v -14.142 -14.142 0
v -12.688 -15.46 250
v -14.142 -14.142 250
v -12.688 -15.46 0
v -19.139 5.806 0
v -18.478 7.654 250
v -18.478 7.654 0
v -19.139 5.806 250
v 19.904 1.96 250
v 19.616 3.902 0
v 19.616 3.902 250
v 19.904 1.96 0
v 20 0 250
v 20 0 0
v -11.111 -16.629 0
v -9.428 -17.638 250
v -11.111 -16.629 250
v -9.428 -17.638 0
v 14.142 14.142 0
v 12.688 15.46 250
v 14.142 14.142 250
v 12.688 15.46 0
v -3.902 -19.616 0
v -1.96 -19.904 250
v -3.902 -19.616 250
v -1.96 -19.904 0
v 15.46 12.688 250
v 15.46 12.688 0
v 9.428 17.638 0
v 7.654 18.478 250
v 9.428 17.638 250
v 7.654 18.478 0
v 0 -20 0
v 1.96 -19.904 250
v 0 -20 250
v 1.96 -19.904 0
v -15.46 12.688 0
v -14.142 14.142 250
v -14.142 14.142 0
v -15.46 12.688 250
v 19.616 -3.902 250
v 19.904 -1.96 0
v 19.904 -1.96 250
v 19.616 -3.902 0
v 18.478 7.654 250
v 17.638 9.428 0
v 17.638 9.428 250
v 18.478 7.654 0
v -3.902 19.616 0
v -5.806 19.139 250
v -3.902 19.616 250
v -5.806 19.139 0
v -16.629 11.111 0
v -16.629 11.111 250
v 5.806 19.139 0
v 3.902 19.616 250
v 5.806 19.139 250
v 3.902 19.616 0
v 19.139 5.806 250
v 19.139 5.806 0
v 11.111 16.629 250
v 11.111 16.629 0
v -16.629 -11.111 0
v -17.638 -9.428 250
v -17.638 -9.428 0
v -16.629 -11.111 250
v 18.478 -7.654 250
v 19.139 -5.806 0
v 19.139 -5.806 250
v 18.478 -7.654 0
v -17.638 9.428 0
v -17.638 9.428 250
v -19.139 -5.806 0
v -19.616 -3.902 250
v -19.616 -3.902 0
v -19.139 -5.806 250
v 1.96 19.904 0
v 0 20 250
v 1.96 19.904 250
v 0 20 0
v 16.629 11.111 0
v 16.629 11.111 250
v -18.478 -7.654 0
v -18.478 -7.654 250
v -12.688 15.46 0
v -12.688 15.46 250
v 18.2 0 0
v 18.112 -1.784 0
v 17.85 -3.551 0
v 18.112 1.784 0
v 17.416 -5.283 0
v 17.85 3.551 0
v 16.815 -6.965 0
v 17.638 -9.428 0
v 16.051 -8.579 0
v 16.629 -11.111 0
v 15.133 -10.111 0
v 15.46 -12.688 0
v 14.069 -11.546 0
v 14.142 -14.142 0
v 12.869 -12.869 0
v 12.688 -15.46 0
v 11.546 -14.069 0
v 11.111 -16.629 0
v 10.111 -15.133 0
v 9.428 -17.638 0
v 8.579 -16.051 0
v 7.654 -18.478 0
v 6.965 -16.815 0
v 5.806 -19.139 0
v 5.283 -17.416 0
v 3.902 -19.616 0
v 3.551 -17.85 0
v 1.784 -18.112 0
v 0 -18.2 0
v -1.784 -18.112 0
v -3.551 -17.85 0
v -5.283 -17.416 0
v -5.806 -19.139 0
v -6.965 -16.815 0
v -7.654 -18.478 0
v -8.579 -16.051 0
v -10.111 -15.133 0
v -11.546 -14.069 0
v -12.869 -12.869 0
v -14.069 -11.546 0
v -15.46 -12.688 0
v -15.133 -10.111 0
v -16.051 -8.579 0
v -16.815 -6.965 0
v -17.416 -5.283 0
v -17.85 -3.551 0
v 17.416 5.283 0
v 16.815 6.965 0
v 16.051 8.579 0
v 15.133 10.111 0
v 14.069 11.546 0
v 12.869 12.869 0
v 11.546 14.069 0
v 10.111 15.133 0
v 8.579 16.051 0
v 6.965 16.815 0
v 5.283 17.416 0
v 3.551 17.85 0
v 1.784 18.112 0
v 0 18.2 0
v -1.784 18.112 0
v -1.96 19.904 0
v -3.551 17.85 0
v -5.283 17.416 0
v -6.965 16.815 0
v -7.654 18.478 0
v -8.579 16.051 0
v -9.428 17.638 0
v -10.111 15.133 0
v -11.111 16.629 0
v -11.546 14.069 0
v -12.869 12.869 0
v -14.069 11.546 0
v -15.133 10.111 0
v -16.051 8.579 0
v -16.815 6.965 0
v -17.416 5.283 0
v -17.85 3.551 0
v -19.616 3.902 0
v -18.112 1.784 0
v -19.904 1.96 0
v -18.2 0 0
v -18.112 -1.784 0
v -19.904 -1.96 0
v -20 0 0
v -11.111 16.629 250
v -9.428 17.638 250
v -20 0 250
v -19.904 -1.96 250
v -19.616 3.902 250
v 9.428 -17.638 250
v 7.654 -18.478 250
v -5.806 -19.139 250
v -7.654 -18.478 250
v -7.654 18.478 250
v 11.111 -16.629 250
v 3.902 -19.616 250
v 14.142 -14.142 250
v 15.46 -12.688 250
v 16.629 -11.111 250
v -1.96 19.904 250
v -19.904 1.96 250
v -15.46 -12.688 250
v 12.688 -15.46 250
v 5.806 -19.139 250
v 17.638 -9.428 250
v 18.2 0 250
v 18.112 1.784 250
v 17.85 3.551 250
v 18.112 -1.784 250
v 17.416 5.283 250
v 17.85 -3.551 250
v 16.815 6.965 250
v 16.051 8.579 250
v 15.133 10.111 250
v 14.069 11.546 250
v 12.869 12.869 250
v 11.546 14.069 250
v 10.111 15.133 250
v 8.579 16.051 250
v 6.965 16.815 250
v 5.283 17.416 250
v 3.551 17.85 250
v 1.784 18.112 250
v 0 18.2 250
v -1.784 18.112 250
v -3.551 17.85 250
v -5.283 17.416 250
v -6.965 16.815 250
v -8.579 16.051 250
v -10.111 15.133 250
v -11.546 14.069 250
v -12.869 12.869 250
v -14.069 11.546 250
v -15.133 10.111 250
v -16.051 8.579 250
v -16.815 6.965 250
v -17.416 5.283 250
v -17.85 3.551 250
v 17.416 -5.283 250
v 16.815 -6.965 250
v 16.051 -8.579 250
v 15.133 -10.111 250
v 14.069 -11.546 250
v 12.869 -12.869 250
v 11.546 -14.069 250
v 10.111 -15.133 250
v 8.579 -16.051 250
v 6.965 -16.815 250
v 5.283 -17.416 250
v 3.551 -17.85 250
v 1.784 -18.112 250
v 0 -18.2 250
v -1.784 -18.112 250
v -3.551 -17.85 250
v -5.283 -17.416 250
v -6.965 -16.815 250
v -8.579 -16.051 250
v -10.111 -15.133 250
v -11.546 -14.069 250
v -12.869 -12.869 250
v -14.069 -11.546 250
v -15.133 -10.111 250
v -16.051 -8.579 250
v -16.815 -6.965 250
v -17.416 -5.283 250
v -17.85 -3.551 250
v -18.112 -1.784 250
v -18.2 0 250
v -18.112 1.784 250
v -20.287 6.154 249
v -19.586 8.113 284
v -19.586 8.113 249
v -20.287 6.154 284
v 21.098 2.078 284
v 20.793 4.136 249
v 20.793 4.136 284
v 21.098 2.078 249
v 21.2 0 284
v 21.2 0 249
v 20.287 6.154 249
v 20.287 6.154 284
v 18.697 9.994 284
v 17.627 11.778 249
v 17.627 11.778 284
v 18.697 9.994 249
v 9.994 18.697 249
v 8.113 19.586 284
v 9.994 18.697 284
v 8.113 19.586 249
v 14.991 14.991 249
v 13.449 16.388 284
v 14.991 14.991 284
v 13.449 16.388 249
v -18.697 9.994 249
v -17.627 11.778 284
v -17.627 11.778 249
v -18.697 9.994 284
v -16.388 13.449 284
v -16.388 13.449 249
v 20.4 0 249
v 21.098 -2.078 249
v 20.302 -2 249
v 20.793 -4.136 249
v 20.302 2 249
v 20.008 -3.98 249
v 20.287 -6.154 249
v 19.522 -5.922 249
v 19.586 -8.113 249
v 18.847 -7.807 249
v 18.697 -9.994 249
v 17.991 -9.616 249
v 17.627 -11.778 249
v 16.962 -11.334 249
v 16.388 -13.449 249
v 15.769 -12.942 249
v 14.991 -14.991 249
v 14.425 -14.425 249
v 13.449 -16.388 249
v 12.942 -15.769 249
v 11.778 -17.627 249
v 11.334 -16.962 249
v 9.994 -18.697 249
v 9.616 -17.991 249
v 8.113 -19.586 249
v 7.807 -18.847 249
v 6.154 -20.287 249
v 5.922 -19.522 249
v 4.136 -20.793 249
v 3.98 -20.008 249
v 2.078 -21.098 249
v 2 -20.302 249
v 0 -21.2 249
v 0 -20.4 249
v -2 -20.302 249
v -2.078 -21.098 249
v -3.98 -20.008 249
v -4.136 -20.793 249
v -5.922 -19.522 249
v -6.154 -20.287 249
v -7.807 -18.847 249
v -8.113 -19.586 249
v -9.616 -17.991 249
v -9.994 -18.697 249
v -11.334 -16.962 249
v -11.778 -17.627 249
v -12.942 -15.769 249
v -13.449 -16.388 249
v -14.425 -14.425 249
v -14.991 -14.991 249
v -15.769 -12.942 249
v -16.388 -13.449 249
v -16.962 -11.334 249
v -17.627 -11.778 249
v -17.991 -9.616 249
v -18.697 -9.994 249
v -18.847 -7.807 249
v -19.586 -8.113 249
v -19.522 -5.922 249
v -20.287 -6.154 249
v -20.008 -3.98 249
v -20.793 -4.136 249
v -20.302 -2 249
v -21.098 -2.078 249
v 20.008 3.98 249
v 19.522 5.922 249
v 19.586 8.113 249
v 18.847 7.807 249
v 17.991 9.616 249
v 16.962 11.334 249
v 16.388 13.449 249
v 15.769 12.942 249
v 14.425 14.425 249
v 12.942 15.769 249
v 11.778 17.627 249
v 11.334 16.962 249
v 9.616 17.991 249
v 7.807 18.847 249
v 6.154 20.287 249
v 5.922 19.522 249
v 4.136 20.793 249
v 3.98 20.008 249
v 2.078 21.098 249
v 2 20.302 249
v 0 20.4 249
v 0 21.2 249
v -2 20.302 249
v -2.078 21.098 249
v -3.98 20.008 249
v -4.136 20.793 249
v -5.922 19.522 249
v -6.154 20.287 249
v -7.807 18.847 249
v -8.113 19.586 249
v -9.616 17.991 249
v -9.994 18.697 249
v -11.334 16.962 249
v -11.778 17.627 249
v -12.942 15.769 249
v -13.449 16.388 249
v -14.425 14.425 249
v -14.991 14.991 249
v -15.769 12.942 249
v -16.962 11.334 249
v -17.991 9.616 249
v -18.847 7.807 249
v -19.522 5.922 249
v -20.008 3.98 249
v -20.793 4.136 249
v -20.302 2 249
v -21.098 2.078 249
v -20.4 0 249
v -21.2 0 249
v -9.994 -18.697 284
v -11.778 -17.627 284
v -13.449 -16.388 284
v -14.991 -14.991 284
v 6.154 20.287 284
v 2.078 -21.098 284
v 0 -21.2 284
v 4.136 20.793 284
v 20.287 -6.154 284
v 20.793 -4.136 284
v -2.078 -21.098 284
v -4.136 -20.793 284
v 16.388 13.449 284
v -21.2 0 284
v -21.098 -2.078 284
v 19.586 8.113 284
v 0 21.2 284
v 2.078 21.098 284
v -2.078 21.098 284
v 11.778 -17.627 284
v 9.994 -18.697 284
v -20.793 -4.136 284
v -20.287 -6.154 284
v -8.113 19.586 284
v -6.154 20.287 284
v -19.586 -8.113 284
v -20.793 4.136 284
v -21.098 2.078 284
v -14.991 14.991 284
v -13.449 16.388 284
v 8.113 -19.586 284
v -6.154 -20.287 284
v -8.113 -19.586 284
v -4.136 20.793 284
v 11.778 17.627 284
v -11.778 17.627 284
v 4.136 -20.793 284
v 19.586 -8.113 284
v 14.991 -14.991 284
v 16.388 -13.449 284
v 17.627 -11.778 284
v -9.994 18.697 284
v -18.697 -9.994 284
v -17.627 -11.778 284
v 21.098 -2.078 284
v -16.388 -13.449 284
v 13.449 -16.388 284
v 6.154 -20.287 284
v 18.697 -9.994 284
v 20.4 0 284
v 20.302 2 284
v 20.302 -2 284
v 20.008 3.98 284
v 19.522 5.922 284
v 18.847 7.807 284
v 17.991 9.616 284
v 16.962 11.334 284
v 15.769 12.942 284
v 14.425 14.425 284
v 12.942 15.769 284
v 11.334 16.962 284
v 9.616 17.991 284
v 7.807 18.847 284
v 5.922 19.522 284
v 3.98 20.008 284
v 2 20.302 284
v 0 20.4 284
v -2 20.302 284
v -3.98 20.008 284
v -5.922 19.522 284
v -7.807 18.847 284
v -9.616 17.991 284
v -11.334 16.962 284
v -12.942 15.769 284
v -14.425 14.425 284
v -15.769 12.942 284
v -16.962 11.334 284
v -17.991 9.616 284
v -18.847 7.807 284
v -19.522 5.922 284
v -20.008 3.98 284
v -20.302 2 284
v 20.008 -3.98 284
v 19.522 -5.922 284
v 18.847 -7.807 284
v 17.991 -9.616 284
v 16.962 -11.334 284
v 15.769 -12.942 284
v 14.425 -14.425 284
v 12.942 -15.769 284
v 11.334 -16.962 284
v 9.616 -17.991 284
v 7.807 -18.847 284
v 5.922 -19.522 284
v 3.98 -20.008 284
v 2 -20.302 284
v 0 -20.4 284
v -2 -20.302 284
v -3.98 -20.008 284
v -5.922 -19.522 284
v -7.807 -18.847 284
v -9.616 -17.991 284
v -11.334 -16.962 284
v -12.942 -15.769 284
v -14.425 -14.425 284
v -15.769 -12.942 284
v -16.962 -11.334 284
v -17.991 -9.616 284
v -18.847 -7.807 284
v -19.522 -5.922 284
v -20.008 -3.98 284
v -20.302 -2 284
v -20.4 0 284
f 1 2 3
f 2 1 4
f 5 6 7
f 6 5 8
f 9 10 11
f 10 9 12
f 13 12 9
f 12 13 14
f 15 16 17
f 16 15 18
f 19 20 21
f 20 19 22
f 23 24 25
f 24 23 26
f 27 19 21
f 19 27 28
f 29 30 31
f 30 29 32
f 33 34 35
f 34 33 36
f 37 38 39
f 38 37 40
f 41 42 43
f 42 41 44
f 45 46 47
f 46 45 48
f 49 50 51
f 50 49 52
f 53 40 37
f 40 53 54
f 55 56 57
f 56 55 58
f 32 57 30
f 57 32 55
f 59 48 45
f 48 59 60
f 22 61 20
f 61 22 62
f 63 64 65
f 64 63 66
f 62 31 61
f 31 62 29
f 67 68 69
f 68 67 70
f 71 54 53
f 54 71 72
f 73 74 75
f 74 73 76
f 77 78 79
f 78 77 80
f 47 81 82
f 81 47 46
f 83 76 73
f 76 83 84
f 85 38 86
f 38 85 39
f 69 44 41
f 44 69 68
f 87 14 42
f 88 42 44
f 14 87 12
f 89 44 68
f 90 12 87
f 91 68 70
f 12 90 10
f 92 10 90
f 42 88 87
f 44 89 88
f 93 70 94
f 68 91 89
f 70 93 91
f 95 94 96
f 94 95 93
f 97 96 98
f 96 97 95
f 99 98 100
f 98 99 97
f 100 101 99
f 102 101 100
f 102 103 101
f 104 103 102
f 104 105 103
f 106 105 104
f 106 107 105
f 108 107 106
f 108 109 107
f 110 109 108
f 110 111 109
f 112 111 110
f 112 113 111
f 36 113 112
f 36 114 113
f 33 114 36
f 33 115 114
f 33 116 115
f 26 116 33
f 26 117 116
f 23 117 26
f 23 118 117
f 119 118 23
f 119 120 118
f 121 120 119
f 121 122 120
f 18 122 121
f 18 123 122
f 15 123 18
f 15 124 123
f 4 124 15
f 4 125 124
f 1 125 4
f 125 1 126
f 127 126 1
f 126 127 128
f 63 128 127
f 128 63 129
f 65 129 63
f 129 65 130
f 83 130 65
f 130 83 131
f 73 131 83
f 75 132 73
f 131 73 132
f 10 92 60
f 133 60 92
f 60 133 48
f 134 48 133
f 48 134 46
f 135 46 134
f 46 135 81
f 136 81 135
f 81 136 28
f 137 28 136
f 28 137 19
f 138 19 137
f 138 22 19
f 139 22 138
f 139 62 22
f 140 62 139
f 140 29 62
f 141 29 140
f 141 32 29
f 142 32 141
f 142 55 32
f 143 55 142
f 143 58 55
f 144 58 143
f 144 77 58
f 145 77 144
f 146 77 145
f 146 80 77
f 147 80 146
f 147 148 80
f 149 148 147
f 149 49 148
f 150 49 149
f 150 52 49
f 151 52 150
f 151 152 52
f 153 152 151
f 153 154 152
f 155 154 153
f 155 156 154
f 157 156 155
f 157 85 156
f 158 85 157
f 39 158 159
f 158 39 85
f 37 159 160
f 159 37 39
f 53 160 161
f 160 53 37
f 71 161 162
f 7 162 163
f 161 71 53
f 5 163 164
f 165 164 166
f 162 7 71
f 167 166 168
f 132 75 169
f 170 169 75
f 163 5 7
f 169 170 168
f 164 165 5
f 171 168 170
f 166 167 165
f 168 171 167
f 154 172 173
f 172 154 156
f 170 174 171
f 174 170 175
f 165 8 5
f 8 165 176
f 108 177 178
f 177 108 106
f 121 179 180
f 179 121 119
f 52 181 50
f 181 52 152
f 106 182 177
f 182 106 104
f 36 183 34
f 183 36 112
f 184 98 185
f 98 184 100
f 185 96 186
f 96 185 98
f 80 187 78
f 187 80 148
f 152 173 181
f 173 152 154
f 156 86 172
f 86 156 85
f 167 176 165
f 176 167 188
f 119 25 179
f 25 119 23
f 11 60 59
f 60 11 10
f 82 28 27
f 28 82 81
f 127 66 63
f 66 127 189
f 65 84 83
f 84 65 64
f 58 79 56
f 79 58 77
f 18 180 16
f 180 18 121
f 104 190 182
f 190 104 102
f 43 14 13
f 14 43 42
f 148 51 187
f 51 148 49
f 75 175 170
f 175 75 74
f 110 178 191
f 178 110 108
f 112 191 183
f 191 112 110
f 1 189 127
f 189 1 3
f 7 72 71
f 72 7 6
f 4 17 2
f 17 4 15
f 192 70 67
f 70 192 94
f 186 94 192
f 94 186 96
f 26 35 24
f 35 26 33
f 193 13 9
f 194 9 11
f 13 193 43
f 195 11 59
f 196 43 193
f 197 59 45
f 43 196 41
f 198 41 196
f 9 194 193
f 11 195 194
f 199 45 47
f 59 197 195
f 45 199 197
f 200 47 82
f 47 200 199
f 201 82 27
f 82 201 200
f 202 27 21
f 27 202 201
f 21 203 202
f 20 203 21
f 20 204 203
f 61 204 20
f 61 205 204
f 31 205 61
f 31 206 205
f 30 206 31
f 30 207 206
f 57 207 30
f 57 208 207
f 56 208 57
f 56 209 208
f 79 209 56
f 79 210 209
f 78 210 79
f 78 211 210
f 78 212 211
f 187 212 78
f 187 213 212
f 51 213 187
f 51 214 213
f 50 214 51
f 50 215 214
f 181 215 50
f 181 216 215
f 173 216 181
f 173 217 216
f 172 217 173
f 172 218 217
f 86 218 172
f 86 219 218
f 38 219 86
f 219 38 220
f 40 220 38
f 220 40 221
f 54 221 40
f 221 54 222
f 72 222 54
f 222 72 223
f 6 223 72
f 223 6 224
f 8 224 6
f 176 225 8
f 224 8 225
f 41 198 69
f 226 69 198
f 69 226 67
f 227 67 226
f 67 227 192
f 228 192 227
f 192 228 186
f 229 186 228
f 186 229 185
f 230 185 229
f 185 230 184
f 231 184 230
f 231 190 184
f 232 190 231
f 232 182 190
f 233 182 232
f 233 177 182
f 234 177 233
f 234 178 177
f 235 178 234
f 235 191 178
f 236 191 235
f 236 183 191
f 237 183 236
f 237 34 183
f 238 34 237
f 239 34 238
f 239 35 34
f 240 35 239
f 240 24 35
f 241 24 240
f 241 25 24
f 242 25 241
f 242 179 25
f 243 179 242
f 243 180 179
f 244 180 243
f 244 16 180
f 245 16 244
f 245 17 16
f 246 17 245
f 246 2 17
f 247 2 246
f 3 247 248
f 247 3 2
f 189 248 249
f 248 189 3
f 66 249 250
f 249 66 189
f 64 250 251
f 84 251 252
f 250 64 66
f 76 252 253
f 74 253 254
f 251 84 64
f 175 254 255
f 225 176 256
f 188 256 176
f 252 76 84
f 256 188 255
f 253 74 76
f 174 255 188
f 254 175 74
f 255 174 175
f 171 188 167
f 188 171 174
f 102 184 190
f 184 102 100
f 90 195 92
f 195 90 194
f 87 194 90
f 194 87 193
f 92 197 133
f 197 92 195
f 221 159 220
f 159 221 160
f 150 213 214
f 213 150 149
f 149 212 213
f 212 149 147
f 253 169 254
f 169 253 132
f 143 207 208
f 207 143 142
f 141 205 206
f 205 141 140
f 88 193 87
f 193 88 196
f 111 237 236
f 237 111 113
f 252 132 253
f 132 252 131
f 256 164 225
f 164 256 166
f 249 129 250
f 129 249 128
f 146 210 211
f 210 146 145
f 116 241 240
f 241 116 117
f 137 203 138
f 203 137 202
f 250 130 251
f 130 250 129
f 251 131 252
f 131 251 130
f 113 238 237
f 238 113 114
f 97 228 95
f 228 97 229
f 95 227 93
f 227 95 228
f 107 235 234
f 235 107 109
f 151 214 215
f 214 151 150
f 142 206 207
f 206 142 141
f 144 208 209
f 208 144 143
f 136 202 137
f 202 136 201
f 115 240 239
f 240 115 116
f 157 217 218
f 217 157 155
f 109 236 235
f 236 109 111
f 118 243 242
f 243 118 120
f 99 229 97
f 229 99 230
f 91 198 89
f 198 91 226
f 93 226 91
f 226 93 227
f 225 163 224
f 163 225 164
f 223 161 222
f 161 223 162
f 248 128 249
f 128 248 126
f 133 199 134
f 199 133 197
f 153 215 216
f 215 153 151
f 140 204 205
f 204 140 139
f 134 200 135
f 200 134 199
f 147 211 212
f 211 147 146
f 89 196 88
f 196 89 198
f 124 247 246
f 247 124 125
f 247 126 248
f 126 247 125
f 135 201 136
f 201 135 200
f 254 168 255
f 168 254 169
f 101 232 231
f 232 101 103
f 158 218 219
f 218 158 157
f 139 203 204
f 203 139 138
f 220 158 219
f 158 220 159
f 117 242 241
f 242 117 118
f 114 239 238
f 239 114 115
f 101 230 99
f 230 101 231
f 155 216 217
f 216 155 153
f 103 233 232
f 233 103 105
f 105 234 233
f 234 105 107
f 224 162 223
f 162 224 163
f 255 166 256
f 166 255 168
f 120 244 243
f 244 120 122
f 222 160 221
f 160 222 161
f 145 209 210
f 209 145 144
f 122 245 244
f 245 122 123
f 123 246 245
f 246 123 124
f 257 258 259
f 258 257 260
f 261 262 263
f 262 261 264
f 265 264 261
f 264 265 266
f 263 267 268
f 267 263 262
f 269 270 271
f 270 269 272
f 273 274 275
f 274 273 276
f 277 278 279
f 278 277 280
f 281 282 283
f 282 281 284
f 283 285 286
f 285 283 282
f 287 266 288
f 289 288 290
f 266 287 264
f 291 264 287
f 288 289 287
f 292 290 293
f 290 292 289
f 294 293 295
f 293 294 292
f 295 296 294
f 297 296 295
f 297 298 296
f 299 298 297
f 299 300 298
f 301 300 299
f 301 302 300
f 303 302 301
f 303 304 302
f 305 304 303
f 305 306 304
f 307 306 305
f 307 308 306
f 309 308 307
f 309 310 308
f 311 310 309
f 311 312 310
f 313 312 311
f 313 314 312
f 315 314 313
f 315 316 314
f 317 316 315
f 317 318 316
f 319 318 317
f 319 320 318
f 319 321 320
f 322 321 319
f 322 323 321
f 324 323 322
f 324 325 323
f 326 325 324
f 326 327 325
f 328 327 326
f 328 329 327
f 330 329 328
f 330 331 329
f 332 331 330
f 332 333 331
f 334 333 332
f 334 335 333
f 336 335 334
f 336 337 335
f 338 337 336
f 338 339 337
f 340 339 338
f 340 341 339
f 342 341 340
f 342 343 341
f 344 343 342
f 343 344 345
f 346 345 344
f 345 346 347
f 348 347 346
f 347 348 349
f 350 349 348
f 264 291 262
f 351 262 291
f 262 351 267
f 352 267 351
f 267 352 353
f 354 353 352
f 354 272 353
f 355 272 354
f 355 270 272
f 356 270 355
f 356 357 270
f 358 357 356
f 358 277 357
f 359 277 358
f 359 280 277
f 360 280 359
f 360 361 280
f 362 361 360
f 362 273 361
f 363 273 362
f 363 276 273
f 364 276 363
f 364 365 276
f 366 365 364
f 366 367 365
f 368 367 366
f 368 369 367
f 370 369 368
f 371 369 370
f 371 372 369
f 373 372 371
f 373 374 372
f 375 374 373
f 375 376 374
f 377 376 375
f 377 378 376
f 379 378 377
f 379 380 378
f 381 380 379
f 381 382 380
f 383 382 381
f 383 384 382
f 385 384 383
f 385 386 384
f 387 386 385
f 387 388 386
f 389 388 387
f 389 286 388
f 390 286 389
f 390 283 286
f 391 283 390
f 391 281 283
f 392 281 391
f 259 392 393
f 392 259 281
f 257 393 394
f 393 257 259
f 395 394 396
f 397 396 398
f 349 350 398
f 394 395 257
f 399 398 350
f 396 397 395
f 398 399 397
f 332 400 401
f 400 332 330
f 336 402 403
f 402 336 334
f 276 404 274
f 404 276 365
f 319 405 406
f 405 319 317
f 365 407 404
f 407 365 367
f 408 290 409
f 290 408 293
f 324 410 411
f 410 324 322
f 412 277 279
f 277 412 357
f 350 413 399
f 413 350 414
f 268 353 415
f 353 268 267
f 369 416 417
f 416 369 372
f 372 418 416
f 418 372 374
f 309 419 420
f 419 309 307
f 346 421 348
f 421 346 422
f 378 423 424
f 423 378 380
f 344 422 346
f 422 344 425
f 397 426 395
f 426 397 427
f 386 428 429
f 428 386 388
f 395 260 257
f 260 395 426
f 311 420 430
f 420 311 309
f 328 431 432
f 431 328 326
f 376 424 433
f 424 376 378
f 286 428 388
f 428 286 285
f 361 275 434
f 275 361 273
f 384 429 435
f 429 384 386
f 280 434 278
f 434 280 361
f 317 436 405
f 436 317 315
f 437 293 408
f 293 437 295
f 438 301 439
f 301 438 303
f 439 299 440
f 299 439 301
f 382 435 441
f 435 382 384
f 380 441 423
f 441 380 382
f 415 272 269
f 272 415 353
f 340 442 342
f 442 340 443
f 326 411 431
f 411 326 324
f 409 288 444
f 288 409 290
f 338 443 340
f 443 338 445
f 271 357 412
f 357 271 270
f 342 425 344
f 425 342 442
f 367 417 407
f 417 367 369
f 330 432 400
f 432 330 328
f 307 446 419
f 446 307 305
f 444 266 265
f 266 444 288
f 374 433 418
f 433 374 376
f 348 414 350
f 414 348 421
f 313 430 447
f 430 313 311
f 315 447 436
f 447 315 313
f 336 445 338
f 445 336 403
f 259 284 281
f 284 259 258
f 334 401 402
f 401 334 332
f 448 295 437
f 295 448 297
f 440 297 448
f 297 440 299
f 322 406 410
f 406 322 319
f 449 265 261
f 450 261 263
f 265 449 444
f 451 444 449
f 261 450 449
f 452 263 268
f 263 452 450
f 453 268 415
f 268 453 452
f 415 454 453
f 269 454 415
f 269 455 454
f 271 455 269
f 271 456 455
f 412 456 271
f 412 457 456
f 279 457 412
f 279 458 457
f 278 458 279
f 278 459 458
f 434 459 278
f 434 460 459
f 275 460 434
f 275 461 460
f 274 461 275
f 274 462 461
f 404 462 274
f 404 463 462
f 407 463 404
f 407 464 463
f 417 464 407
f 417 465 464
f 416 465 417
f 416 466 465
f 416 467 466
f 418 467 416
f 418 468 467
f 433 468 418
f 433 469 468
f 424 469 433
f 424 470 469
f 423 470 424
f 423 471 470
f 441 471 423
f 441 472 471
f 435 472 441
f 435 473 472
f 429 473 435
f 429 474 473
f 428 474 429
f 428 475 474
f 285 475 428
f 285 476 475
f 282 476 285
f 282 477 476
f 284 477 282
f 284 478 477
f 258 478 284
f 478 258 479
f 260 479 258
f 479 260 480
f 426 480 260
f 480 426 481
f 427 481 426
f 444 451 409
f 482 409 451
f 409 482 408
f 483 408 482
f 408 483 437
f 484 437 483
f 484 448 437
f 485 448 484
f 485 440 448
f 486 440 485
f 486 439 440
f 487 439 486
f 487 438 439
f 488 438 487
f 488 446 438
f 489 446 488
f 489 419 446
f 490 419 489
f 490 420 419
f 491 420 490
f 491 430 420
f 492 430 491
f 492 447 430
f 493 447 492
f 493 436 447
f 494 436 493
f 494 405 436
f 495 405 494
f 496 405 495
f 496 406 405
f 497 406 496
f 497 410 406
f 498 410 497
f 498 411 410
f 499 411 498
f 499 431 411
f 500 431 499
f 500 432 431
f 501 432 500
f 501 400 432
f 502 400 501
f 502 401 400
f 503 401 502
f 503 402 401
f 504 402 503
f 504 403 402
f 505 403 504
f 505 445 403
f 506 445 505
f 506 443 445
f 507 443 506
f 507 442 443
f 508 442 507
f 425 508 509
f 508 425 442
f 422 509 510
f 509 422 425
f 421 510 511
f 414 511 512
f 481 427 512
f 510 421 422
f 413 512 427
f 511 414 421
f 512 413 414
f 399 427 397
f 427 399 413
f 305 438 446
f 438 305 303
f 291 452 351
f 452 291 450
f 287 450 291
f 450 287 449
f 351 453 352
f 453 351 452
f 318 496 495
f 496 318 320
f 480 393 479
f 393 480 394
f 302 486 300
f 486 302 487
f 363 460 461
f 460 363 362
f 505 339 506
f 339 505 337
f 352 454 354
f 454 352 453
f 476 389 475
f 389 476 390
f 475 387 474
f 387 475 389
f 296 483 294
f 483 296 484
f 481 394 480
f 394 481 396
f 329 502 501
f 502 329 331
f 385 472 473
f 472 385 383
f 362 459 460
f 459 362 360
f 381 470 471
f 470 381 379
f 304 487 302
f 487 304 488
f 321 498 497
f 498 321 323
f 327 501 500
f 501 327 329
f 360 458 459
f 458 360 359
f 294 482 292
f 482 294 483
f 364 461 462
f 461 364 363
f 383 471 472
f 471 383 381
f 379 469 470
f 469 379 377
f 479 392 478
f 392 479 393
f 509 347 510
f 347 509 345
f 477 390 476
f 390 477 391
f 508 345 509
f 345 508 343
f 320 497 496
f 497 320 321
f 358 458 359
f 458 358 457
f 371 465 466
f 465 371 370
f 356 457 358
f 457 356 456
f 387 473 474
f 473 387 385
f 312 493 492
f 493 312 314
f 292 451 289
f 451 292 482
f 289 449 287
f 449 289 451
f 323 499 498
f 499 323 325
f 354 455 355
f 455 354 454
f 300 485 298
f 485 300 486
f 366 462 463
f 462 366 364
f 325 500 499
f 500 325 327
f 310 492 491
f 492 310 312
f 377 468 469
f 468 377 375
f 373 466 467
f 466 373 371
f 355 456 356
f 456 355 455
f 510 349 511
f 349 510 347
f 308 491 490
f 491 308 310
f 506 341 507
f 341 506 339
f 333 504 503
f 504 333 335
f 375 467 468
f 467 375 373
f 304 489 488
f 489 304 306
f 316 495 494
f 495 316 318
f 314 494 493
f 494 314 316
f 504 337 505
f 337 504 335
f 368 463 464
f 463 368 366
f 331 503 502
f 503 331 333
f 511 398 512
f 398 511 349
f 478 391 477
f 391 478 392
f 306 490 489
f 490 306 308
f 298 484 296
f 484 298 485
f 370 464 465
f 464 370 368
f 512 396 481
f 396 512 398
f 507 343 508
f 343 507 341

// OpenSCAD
// Parameters
pipe_standard = 1; //[1:1:1]
nominal_diameter = 40; //[20:80:1]
length_mm = 250; //[125:500:1]
include_end_fitting = 1; //[0:1:1]
od_mm = 40; //[20:80:0.5]
wall_thickness_mm = 1.8; //[0.9:3.6:0.1]
fit_length_mm = 35; //[18:70:1]
fit_wall_extra_mm = 1.2; //[0.6:2.4:0.1]
fit_socket_clearance_mm = 0.4; //[0.2:0.8:0.05]
fit_stop_thickness_mm = 2.0; //[1.0:4.0:0.1]
fit_stop_depth_mm = 12; //[6:24:1]
overlap_mm = 1.0; //[0.5:2.0:0.1]

// HT Pipe Segment - Complete Geometry
module ht_pipe() {
  color([0.85, 0.85, 0.8]) {
    // Outer pipe
    difference() {
      translate([0, 0, 0])
        cylinder(r=od_mm/2, h=length_mm, center=false, $fn=64);
      // Hollow bore
      translate([0, 0, -overlap_mm/2])
        cylinder(r=od_mm/2 - wall_thickness_mm, h=length_mm + overlap_mm, center=false, $fn=64);
    }
    
    // End fitting
    if (include_end_fitting) {
      difference() {
        // Outer fitting
        translate([0, 0, length_mm - overlap_mm])
          cylinder(r=od_mm/2 + fit_wall_extra_mm, h=fit_length_mm, center=false, $fn=64);
        // Socket void
        translate([0, 0, length_mm - overlap_mm - overlap_mm/2])
          cylinder(r=od_mm/2 + fit_socket_clearance_mm, h=fit_length_mm + overlap_mm, center=false, $fn=64);
        // Stop void
        translate([0, 0, length_mm - overlap_mm + fit_stop_depth_mm - fit_stop_thickness_mm/2])
          cylinder(r=od_mm/2 + fit_socket_clearance_mm, h=fit_stop_thickness_mm, center=false, $fn=64);
      }
    }
  }
}

// Assembly
module assembly() {
  ht_pipe();
}

assembly();
